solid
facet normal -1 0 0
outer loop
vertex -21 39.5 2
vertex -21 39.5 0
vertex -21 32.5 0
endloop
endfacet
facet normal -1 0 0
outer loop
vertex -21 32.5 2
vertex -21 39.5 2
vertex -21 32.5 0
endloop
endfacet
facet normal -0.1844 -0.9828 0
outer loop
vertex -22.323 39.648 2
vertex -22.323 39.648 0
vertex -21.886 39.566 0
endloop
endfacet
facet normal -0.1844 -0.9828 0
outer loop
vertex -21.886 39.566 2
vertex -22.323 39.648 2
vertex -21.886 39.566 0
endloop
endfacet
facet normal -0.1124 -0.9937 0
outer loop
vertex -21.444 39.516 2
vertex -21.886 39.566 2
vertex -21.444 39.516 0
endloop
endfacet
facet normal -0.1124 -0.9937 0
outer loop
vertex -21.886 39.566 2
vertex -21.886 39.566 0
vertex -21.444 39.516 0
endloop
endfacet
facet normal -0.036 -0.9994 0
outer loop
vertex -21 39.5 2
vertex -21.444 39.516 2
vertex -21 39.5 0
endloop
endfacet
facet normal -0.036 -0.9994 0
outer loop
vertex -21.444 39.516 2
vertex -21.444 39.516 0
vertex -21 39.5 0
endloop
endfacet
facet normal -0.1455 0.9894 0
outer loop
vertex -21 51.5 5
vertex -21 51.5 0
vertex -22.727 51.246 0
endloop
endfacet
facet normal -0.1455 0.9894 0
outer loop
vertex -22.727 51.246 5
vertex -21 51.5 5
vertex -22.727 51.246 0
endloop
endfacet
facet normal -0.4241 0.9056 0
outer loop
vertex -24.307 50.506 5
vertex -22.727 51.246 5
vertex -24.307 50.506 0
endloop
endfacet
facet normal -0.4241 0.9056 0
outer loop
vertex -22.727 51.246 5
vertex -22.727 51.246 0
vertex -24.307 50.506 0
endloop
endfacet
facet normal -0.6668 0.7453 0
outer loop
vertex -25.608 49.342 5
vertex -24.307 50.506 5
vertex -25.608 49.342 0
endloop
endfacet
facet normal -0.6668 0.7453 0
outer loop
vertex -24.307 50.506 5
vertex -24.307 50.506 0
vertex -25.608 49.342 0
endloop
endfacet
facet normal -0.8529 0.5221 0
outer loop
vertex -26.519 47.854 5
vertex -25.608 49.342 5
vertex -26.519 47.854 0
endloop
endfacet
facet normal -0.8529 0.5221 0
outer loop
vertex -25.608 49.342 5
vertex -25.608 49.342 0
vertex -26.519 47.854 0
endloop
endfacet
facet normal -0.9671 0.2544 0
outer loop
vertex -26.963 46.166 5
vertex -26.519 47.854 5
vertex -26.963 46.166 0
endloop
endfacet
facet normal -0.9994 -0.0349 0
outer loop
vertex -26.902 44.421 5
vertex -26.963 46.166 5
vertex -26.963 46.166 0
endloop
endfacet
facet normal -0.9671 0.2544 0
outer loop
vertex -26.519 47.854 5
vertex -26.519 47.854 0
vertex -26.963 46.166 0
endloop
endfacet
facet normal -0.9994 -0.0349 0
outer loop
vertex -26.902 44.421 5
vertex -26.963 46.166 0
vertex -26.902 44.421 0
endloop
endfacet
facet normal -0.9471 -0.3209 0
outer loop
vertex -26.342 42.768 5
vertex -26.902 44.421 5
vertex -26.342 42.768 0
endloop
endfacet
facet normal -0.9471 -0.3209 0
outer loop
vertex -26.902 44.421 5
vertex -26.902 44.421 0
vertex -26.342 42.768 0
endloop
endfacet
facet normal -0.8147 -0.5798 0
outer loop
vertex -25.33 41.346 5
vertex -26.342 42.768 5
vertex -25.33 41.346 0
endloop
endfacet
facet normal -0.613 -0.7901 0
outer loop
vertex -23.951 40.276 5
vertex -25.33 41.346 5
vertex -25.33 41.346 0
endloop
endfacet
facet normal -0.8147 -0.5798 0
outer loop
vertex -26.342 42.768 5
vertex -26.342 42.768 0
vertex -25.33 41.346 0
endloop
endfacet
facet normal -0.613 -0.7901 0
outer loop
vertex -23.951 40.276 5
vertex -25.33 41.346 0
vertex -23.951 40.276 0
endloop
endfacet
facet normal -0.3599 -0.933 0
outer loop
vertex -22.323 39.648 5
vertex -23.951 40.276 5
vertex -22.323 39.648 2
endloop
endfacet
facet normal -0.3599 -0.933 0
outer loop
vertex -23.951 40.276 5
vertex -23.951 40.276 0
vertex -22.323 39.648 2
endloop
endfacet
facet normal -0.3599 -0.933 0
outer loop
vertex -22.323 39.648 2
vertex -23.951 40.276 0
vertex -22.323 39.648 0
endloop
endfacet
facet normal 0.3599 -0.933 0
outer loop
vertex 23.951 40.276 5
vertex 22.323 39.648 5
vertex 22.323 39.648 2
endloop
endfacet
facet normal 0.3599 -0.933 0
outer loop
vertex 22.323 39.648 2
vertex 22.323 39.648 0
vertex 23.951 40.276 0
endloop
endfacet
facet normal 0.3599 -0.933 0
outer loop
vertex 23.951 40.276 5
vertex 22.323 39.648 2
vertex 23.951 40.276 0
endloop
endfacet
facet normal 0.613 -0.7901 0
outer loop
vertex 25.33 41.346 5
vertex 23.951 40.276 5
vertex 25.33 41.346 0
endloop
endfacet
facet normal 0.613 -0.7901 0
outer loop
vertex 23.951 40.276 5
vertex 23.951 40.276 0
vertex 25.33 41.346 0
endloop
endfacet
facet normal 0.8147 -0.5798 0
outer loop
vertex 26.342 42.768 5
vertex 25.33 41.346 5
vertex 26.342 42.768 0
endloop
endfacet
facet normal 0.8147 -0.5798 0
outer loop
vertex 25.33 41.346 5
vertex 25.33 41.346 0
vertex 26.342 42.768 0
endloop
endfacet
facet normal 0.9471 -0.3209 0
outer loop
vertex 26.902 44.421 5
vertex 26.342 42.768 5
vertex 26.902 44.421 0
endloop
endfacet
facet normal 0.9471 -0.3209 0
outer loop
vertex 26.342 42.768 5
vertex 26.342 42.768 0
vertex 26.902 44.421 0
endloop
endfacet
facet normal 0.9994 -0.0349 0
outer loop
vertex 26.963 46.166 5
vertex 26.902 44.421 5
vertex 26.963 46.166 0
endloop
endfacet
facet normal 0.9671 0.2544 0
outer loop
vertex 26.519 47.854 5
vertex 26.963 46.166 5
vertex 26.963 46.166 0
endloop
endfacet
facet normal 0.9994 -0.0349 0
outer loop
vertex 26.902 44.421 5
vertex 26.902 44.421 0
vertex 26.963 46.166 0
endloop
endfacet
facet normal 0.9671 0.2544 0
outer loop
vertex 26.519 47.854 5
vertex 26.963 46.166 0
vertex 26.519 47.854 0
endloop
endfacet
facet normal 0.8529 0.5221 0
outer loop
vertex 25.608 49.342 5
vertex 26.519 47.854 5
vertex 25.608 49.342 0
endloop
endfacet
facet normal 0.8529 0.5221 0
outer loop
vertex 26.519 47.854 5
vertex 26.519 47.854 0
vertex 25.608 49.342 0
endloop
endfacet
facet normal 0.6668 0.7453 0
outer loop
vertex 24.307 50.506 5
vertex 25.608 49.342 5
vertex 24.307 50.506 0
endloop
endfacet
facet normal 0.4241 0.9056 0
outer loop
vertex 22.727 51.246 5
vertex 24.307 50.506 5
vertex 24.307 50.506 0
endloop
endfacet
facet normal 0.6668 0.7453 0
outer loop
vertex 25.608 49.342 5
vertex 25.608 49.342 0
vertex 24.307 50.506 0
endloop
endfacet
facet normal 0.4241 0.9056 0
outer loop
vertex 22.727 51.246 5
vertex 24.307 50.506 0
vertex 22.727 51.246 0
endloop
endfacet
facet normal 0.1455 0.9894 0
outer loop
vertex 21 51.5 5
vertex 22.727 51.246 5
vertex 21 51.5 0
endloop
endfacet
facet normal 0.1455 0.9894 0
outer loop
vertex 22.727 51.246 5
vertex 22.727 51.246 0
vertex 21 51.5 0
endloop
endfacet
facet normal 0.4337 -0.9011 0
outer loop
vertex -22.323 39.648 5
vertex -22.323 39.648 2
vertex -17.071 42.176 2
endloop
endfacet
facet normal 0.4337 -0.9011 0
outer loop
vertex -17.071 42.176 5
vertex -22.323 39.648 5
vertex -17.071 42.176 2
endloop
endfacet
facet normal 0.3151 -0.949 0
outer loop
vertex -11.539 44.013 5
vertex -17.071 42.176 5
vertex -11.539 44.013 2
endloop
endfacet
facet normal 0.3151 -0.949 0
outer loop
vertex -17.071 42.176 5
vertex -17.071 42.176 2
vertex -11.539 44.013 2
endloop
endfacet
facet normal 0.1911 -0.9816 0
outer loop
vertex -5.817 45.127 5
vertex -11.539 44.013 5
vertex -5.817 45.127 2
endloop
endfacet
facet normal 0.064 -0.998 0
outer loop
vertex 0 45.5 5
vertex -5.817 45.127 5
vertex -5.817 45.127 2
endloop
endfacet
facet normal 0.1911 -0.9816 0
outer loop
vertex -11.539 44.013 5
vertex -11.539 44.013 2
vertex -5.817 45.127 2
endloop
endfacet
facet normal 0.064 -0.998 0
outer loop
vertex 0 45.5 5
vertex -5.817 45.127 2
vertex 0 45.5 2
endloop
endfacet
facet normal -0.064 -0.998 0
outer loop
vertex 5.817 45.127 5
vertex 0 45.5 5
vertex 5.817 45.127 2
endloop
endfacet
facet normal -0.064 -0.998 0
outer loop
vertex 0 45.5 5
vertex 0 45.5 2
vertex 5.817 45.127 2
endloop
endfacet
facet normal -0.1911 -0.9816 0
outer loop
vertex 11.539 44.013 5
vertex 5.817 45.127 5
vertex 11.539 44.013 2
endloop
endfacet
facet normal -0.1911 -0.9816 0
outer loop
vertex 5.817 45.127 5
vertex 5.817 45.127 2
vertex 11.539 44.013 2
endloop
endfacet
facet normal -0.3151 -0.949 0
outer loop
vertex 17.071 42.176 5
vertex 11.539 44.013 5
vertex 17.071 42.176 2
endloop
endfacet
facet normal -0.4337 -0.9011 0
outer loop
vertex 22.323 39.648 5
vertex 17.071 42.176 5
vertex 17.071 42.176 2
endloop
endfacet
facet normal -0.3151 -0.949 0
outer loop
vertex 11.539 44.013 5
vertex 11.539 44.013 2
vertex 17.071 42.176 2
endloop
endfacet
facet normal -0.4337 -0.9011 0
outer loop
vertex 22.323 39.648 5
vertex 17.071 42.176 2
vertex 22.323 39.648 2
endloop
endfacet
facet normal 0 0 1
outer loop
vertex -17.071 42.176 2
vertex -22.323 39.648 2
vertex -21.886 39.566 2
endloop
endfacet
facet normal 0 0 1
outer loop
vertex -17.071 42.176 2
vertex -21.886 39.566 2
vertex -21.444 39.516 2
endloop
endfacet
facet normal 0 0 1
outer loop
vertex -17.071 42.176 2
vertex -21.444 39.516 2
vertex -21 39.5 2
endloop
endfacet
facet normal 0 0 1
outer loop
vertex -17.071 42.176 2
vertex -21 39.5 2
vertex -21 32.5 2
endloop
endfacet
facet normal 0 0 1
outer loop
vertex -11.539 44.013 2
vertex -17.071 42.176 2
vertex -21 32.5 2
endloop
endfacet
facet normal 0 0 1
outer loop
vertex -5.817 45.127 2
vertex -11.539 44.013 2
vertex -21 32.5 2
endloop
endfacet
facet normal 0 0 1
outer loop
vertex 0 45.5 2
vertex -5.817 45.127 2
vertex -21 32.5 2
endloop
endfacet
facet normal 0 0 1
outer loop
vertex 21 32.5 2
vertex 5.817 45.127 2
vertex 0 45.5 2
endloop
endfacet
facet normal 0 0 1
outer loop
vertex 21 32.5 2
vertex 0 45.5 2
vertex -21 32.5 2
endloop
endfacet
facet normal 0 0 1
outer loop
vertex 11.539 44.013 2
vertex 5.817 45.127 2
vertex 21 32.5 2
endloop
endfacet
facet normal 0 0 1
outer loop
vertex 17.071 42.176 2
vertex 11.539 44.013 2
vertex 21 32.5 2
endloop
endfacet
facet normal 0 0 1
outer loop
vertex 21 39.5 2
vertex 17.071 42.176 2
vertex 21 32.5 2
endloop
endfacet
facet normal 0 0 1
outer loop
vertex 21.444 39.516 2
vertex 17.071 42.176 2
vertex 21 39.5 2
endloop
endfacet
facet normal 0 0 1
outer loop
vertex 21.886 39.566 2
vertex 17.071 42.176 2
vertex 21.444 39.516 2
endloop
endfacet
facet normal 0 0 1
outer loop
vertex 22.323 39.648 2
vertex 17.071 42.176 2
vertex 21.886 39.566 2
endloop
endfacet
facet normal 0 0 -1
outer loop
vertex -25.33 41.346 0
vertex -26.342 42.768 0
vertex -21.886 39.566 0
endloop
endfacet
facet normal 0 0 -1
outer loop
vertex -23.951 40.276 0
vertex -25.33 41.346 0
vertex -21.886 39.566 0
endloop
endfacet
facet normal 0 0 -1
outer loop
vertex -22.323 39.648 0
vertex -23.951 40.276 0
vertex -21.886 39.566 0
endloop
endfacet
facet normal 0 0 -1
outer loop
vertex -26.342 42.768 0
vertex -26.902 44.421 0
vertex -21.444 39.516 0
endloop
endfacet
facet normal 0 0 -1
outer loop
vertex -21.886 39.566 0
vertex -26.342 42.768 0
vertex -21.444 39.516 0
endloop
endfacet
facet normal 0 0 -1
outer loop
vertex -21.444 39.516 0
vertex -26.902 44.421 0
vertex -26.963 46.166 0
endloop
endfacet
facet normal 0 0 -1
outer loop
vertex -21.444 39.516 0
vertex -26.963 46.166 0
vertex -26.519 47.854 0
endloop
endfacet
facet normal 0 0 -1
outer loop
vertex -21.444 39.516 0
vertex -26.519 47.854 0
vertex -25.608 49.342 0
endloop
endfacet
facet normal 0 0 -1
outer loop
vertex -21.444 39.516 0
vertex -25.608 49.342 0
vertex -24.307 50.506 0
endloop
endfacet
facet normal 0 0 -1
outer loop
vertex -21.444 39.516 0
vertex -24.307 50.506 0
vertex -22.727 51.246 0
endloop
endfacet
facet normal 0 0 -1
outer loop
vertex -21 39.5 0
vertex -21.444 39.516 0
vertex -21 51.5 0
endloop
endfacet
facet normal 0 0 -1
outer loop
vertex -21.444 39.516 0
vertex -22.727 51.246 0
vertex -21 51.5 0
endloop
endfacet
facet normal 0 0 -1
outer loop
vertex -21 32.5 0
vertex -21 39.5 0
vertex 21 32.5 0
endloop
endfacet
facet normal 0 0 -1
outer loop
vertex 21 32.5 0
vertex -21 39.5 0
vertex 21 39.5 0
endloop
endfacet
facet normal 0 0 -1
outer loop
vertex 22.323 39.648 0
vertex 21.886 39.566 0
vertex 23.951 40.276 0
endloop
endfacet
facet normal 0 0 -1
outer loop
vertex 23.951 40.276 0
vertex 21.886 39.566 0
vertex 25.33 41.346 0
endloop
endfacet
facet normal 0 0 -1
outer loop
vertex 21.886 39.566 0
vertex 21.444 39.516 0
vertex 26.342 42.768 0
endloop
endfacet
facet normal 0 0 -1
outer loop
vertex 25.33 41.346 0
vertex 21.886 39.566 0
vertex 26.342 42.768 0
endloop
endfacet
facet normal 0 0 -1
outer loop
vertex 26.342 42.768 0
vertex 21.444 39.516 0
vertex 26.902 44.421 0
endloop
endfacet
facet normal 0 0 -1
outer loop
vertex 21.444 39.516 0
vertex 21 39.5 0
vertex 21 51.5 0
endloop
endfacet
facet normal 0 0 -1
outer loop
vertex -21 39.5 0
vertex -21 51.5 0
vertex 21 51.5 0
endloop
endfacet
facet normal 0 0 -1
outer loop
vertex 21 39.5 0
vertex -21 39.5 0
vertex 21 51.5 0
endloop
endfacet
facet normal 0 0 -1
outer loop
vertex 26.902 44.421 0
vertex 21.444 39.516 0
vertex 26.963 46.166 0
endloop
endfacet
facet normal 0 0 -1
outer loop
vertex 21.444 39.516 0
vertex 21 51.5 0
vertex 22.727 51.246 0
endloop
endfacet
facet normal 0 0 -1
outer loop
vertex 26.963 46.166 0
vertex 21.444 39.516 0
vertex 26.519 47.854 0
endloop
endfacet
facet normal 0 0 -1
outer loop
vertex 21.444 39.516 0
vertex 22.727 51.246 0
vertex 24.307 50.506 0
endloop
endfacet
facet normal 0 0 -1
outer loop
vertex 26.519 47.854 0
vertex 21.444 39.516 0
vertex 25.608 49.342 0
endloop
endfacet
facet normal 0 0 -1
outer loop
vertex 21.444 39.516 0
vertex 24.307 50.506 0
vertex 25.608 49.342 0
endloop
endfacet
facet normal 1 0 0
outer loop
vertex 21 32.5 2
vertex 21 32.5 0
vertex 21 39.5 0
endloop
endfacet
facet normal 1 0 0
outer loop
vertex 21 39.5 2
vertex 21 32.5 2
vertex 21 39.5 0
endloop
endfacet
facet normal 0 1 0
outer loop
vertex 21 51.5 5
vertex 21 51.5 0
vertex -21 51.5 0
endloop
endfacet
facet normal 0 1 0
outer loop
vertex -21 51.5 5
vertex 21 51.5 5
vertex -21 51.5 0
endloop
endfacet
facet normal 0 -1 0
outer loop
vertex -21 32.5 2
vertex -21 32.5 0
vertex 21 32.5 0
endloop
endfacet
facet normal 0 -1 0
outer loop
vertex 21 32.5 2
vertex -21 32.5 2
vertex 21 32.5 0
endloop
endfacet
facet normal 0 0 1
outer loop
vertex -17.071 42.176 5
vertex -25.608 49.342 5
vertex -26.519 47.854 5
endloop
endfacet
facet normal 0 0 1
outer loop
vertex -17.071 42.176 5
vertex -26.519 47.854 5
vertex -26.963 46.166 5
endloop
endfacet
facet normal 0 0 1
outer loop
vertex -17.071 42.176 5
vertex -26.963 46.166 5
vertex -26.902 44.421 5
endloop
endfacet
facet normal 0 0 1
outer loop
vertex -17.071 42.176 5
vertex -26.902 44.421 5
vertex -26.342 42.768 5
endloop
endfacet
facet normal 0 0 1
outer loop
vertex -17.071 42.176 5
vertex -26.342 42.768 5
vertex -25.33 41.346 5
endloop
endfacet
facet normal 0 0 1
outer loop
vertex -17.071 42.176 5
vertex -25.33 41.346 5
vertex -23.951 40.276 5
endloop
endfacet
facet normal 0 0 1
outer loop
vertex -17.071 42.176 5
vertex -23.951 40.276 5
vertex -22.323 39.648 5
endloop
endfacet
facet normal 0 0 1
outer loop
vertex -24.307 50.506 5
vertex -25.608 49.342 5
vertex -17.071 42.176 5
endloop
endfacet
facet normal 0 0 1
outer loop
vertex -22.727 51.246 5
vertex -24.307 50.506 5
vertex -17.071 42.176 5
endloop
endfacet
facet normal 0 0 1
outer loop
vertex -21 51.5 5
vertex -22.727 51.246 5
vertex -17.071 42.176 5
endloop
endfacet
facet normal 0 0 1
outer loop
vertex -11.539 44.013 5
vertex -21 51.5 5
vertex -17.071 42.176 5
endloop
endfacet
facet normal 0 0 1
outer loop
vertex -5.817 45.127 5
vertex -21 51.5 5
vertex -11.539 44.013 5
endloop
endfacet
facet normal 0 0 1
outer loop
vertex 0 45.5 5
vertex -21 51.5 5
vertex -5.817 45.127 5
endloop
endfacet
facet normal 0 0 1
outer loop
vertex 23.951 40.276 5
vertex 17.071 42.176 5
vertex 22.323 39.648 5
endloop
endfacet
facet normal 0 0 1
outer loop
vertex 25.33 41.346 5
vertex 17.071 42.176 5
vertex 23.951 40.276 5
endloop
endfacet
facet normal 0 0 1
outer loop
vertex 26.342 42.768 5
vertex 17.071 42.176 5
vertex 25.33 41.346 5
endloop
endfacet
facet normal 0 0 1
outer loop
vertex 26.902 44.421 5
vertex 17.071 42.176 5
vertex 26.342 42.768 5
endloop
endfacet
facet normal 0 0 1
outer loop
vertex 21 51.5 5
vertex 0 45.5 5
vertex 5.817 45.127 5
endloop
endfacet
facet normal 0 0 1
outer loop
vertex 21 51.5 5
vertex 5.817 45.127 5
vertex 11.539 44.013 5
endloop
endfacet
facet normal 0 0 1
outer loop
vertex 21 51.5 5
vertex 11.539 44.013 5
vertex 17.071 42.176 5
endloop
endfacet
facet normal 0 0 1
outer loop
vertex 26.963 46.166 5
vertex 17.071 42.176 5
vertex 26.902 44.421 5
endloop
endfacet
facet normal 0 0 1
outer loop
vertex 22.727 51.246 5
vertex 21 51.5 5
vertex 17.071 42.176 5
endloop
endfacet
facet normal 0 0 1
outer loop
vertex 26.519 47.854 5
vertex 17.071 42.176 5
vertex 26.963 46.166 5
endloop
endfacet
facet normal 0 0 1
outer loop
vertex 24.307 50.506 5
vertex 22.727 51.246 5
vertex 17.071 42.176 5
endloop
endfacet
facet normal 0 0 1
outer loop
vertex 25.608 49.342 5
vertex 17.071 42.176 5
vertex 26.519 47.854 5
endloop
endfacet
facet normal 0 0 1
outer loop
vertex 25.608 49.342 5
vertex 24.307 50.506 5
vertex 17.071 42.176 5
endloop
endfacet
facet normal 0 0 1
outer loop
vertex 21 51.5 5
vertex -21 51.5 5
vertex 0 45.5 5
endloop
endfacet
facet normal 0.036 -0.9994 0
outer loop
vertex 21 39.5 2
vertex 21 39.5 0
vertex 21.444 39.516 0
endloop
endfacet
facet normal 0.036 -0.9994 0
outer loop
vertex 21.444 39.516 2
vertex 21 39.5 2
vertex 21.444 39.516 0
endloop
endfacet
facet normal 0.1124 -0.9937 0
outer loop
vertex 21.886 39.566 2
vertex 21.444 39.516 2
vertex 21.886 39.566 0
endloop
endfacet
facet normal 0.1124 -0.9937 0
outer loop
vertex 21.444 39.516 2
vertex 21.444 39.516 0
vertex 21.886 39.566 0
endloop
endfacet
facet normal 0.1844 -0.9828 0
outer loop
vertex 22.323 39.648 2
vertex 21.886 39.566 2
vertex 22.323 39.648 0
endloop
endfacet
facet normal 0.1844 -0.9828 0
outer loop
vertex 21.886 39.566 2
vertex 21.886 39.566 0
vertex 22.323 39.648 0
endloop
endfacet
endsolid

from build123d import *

# Parameters (mm, degrees)
F1_DEPTH = 5
F2_DEPTH = 2


with BuildPart() as f1:
    # F0 (on Top) → F1 (new body)
    with BuildSketch(Plane.XY):
        with BuildLine():
            ThreePointArc((-22.322925, 39.647661), (0, 45.5), (22.322925, 39.647661))
            ThreePointArc((22.322925, 39.647661), (26.96297, 46.16557), (21, 51.5))
            Line((21, 51.5), (-21, 51.5))
            ThreePointArc((-21, 51.5), (-26.96297, 46.16557), (-22.322925, 39.647661))
        make_face()
    extrude(amount=F1_DEPTH)

    # F0 (on Top) → F2 (join)
    with BuildSketch(Plane.XY):
        with BuildLine():
            ThreePointArc((21, 39.5), (21.66557, 39.53703), (22.322925, 39.647661))
            ThreePointArc((22.322925, 39.647661), (0, 45.5), (-22.322925, 39.647661))
            ThreePointArc((-22.322925, 39.647661), (-21.66557, 39.53703), (-21, 39.5))
            Line((-21, 39.5), (-21, 32.5))
            Line((-21, 32.5), (21, 32.5))
            Line((21, 32.5), (21, 39.5))
        make_face()
    extrude(amount=F2_DEPTH)


solid = f1.part
